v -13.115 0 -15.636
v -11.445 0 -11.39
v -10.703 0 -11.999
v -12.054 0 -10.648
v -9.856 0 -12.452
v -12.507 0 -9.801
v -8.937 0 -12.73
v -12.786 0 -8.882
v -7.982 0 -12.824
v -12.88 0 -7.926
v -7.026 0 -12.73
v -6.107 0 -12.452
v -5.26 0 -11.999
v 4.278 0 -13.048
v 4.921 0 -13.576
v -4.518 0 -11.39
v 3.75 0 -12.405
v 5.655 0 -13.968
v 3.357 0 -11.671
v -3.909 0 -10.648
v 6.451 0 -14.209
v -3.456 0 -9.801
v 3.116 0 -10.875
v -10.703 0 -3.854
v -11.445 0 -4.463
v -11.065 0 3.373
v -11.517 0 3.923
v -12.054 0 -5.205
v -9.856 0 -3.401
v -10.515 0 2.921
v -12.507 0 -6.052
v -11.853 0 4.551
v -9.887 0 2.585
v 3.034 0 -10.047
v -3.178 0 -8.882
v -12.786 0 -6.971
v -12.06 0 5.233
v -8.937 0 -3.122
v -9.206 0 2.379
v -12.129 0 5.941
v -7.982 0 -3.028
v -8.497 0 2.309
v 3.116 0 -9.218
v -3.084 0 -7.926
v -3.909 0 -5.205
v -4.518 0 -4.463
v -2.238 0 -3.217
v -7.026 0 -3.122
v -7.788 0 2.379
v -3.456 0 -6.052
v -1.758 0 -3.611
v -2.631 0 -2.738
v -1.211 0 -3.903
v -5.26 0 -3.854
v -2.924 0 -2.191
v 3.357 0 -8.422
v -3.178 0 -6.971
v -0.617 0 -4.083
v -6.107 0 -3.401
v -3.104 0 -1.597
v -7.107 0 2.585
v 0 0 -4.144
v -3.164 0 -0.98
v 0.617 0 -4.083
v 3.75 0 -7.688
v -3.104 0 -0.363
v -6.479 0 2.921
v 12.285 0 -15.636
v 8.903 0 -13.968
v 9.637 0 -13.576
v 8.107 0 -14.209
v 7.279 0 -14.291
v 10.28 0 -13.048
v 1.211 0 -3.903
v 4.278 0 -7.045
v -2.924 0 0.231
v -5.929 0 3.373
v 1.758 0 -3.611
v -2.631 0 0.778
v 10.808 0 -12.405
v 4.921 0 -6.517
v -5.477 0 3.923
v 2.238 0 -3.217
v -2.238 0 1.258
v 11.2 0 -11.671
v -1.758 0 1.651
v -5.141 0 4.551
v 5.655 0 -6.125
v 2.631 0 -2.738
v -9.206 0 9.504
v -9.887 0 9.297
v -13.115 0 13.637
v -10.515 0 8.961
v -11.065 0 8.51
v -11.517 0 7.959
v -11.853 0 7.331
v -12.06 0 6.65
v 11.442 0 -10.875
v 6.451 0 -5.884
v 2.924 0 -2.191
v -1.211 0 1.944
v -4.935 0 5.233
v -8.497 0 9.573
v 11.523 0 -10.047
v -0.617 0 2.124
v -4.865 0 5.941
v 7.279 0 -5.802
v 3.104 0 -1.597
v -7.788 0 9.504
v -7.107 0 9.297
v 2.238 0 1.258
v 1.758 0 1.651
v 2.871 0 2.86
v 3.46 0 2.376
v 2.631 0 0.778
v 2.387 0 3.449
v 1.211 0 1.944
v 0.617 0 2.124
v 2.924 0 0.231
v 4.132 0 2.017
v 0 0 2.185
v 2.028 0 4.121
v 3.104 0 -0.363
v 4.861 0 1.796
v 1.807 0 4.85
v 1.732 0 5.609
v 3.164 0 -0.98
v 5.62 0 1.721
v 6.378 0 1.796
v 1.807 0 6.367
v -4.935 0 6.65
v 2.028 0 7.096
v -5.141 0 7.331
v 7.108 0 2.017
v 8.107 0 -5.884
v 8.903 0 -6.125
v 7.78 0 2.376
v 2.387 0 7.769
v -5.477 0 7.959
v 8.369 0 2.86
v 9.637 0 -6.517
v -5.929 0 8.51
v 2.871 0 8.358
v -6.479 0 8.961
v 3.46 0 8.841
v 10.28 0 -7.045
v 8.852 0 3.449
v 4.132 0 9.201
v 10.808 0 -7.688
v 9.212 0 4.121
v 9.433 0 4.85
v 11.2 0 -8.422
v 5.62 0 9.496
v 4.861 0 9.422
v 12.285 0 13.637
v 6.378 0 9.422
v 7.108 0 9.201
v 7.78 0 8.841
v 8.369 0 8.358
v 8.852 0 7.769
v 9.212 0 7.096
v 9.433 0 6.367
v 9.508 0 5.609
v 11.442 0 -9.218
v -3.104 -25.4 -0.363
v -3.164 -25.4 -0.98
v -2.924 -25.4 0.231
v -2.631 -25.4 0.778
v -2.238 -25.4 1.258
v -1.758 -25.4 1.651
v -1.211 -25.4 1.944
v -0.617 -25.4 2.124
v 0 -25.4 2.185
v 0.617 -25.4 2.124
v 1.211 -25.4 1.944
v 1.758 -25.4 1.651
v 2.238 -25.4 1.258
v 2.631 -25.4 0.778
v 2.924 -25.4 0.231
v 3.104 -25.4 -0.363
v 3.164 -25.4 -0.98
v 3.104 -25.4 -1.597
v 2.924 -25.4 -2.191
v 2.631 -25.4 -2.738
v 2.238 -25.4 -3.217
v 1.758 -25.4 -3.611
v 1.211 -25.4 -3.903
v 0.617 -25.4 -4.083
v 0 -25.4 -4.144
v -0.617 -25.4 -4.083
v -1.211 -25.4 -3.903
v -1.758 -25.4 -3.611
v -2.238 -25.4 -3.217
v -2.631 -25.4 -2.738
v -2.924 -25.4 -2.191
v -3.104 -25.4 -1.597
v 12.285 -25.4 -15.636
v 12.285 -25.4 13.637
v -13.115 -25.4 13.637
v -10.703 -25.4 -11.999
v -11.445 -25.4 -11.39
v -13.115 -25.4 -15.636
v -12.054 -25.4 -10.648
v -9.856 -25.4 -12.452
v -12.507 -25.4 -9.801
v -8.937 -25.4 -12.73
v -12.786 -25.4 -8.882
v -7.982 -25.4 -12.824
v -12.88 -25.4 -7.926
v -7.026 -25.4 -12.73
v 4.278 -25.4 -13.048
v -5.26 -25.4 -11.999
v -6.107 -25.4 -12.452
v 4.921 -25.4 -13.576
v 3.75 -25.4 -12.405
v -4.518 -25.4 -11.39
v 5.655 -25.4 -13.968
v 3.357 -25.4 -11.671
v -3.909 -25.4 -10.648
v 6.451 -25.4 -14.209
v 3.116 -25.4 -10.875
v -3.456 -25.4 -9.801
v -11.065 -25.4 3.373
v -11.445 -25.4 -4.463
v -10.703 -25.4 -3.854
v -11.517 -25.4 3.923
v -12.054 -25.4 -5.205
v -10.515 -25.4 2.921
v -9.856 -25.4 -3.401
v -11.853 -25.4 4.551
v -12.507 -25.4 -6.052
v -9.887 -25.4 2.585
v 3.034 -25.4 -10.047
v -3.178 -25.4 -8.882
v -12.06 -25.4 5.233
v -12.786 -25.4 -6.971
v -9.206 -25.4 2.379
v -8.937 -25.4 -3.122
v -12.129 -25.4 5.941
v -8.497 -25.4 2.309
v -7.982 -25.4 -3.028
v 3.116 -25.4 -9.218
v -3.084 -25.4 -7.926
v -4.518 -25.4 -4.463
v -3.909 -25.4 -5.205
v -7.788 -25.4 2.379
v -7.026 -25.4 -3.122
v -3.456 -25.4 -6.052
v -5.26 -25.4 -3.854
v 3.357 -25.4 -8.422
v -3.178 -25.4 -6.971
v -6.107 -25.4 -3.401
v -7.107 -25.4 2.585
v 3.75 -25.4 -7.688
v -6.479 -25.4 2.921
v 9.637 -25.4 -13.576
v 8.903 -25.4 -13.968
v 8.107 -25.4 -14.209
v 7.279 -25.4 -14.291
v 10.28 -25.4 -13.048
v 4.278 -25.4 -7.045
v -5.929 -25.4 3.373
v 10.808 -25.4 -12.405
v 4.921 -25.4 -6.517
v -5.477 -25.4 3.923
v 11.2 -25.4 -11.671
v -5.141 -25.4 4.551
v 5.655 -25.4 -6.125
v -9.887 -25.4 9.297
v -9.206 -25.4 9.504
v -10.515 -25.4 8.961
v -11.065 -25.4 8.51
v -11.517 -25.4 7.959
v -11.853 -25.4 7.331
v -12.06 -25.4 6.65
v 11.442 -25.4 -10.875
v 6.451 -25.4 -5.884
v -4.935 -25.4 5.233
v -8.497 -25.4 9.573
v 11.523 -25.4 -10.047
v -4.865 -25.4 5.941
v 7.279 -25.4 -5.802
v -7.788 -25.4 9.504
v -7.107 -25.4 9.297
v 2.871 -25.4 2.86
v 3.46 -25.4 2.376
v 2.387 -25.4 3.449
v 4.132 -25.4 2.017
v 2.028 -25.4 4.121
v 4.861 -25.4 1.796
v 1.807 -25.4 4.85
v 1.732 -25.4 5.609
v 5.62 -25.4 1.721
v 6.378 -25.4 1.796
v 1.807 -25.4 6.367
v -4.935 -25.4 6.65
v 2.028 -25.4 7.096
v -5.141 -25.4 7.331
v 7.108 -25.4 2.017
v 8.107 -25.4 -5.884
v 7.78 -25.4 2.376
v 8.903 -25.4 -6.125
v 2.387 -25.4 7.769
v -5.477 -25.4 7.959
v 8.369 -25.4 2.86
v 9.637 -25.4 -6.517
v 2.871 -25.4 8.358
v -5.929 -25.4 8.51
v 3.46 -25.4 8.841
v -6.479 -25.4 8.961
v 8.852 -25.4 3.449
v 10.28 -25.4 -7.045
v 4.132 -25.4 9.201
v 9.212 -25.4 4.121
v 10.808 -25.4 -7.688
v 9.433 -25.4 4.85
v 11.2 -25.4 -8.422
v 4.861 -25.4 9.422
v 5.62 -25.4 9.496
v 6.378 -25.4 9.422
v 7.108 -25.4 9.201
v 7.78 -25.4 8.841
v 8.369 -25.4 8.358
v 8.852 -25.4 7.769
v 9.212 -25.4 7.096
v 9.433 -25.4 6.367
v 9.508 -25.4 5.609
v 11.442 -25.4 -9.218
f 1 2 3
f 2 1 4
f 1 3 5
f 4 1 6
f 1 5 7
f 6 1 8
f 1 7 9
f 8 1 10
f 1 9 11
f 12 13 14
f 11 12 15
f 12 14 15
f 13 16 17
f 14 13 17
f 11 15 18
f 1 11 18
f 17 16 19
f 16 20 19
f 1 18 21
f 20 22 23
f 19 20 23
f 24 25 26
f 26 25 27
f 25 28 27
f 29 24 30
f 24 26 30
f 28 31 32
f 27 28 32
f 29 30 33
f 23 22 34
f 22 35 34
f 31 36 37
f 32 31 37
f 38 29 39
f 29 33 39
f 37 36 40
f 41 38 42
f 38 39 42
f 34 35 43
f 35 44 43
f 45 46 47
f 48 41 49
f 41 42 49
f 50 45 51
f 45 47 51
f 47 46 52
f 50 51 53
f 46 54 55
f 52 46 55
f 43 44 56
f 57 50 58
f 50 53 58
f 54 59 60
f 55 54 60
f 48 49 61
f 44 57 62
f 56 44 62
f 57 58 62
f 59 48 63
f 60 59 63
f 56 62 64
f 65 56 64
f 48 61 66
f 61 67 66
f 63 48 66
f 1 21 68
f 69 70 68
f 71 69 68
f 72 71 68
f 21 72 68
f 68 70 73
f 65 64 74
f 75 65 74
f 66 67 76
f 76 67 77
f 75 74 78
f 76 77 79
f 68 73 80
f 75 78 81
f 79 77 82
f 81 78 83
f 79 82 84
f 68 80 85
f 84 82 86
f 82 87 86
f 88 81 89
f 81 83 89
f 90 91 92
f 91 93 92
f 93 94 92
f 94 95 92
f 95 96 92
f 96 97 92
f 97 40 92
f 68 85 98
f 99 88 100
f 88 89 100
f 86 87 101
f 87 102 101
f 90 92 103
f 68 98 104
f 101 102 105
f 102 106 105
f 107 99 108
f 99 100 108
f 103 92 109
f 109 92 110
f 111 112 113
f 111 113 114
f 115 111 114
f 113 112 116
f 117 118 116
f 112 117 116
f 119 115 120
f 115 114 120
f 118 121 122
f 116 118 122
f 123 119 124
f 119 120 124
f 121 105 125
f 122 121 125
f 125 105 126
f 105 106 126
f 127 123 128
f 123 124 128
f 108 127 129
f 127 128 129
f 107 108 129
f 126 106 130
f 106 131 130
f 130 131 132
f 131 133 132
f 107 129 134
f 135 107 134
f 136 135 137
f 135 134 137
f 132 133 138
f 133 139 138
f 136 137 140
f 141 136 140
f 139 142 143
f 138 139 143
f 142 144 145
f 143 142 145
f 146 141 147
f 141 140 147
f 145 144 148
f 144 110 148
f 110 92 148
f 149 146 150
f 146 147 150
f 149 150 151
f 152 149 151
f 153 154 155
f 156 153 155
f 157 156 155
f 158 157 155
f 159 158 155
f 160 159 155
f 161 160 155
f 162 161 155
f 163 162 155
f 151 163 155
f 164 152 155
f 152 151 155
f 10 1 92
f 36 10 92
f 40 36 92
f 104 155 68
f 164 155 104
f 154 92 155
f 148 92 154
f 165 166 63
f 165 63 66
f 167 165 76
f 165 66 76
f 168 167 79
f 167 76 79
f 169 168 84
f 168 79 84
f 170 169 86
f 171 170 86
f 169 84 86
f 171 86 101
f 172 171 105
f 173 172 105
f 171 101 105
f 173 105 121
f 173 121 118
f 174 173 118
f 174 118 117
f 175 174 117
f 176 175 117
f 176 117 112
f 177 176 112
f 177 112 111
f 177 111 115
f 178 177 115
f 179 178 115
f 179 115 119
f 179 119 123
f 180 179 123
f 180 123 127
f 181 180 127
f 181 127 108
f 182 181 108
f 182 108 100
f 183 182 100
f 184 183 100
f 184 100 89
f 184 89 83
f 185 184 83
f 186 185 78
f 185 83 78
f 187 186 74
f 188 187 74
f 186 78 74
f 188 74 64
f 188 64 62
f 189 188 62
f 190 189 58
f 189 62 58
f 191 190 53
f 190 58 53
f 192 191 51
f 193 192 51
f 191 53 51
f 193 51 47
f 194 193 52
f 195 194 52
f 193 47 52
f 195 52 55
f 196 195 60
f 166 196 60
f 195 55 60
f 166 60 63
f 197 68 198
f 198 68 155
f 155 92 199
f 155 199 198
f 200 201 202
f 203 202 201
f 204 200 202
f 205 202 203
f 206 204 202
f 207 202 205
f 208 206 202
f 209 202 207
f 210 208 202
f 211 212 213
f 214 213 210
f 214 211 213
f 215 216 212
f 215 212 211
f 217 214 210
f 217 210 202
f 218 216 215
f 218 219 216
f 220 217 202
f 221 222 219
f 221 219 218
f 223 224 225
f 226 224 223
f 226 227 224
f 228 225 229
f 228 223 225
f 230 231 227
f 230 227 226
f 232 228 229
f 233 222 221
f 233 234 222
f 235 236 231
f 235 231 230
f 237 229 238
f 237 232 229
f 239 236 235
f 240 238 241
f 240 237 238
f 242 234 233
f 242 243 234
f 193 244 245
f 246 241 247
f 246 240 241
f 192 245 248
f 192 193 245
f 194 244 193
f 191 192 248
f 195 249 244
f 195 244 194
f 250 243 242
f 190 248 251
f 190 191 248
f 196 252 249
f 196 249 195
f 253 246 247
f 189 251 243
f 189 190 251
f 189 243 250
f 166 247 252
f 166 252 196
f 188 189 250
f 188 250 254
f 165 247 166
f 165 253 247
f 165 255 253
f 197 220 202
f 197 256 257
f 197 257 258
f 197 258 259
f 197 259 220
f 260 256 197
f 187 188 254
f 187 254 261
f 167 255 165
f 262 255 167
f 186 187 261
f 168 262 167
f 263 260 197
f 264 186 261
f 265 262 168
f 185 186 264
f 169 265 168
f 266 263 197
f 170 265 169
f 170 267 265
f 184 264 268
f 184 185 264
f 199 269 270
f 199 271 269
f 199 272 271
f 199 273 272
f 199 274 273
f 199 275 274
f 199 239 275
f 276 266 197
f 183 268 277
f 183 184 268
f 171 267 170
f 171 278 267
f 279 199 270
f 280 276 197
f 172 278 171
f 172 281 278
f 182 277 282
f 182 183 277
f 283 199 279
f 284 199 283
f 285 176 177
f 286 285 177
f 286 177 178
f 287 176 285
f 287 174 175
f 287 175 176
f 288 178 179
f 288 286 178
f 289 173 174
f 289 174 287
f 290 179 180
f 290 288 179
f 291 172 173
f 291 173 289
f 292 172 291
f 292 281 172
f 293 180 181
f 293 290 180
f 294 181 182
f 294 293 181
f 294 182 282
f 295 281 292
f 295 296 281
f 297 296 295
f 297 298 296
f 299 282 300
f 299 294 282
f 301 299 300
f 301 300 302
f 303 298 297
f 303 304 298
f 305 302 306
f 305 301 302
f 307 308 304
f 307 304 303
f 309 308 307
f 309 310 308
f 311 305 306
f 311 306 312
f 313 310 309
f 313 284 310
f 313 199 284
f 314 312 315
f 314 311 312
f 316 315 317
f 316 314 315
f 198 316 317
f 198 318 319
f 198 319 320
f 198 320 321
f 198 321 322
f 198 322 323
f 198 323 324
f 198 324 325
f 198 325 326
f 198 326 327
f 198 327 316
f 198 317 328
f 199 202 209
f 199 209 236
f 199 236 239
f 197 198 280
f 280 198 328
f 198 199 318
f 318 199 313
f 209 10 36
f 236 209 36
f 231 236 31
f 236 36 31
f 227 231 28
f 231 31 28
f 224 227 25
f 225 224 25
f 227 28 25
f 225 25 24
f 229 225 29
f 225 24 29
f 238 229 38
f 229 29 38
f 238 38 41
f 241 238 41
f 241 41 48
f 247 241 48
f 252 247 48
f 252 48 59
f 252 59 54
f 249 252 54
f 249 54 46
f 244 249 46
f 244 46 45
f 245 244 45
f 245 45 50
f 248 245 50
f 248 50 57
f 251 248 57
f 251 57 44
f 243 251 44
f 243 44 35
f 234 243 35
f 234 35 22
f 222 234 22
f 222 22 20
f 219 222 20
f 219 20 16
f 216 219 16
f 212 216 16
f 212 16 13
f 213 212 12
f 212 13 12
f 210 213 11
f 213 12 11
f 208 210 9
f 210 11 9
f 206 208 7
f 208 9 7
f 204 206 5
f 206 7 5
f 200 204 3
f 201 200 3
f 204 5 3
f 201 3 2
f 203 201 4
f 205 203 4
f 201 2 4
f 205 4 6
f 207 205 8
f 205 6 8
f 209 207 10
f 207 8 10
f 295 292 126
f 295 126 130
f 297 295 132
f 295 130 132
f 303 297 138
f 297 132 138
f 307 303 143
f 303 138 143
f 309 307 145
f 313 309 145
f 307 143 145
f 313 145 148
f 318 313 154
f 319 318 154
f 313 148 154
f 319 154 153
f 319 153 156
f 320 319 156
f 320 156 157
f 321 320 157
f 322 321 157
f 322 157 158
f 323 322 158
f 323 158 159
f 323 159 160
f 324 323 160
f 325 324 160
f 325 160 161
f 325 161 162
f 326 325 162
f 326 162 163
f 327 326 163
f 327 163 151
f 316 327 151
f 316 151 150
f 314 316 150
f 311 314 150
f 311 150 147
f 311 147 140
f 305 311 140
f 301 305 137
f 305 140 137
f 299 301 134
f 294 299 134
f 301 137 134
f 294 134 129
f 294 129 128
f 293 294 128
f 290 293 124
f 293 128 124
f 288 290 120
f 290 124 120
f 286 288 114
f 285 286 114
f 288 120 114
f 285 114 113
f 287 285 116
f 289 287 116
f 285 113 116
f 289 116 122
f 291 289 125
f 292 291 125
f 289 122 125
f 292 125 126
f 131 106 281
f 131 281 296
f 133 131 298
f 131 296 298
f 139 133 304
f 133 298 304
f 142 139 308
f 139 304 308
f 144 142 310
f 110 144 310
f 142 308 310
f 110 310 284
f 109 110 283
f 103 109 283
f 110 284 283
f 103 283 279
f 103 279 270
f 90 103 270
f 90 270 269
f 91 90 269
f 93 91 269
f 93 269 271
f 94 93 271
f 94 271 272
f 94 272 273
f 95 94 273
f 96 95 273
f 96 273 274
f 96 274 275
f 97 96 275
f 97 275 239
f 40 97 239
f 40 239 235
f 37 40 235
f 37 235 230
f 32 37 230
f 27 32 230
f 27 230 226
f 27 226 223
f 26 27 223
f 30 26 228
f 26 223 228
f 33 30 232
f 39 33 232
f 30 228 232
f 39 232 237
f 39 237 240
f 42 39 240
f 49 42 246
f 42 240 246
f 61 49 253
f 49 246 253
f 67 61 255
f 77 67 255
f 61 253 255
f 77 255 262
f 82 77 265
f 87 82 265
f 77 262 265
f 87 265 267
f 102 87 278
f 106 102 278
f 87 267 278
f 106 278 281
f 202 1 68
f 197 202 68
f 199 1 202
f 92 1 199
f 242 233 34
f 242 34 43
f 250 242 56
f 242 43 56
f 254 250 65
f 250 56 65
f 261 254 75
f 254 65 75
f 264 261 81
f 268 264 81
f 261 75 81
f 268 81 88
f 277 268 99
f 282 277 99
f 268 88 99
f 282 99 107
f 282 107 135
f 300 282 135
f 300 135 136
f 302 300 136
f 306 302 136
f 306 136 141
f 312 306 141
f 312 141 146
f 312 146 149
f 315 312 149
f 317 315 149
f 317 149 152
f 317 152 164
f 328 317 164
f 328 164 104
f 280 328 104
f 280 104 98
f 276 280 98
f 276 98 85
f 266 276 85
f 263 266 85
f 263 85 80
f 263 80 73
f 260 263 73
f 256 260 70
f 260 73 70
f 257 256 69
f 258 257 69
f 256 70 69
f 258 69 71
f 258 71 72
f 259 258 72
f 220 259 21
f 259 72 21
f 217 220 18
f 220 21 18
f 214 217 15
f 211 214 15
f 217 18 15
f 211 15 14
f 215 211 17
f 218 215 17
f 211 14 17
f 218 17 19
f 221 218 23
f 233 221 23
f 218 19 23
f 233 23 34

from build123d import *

# Parameters (mm, degrees)
F0_W     = 25.4
F0_H     = 29.27313
F1_DEPTH = 25.4
F2_R     = 3.632204
F3_DEPTH = 30.226
F4_R     = 3.164391
F4_R_2   = 4.898125
F4_R_3   = 4.24451
F4_R_4   = 3.887819
F5_DEPTH = 25.401


with BuildPart() as f1:
    # F0 (on Front) → F1 (new body)
    with BuildSketch(Plane.XZ):
        with Locations((-0.414785, -0.999168)):
            Rectangle(F0_W, F0_H)
    extrude(amount=F1_DEPTH)

    # F2 (on face) → F3 (cut)
    with BuildSketch(Plane.XZ.offset(25.4)):
        with Locations((-8.4971, 5.941204)):
            Circle(F2_R)
    extrude(amount=-F3_DEPTH, mode=Mode.SUBTRACT)

    # F4 (on face) → F5 (cut, through all)
    with BuildSketch(Plane(origin=(0, 0, 0), x_dir=(-1, 0, 0), z_dir=(0, 1, 0))):
        with Locations((0, -0.979845)):
            Circle(F4_R)
        with Locations((7.981689, -7.926342)):
            Circle(F4_R_2)
        with Locations((-7.278915, -10.046526)):
            Circle(F4_R_3)
        with Locations((-5.619815, 5.608665)):
            Circle(F4_R_4)
    extrude(amount=-F5_DEPTH, mode=Mode.SUBTRACT)


solid = f1.part
